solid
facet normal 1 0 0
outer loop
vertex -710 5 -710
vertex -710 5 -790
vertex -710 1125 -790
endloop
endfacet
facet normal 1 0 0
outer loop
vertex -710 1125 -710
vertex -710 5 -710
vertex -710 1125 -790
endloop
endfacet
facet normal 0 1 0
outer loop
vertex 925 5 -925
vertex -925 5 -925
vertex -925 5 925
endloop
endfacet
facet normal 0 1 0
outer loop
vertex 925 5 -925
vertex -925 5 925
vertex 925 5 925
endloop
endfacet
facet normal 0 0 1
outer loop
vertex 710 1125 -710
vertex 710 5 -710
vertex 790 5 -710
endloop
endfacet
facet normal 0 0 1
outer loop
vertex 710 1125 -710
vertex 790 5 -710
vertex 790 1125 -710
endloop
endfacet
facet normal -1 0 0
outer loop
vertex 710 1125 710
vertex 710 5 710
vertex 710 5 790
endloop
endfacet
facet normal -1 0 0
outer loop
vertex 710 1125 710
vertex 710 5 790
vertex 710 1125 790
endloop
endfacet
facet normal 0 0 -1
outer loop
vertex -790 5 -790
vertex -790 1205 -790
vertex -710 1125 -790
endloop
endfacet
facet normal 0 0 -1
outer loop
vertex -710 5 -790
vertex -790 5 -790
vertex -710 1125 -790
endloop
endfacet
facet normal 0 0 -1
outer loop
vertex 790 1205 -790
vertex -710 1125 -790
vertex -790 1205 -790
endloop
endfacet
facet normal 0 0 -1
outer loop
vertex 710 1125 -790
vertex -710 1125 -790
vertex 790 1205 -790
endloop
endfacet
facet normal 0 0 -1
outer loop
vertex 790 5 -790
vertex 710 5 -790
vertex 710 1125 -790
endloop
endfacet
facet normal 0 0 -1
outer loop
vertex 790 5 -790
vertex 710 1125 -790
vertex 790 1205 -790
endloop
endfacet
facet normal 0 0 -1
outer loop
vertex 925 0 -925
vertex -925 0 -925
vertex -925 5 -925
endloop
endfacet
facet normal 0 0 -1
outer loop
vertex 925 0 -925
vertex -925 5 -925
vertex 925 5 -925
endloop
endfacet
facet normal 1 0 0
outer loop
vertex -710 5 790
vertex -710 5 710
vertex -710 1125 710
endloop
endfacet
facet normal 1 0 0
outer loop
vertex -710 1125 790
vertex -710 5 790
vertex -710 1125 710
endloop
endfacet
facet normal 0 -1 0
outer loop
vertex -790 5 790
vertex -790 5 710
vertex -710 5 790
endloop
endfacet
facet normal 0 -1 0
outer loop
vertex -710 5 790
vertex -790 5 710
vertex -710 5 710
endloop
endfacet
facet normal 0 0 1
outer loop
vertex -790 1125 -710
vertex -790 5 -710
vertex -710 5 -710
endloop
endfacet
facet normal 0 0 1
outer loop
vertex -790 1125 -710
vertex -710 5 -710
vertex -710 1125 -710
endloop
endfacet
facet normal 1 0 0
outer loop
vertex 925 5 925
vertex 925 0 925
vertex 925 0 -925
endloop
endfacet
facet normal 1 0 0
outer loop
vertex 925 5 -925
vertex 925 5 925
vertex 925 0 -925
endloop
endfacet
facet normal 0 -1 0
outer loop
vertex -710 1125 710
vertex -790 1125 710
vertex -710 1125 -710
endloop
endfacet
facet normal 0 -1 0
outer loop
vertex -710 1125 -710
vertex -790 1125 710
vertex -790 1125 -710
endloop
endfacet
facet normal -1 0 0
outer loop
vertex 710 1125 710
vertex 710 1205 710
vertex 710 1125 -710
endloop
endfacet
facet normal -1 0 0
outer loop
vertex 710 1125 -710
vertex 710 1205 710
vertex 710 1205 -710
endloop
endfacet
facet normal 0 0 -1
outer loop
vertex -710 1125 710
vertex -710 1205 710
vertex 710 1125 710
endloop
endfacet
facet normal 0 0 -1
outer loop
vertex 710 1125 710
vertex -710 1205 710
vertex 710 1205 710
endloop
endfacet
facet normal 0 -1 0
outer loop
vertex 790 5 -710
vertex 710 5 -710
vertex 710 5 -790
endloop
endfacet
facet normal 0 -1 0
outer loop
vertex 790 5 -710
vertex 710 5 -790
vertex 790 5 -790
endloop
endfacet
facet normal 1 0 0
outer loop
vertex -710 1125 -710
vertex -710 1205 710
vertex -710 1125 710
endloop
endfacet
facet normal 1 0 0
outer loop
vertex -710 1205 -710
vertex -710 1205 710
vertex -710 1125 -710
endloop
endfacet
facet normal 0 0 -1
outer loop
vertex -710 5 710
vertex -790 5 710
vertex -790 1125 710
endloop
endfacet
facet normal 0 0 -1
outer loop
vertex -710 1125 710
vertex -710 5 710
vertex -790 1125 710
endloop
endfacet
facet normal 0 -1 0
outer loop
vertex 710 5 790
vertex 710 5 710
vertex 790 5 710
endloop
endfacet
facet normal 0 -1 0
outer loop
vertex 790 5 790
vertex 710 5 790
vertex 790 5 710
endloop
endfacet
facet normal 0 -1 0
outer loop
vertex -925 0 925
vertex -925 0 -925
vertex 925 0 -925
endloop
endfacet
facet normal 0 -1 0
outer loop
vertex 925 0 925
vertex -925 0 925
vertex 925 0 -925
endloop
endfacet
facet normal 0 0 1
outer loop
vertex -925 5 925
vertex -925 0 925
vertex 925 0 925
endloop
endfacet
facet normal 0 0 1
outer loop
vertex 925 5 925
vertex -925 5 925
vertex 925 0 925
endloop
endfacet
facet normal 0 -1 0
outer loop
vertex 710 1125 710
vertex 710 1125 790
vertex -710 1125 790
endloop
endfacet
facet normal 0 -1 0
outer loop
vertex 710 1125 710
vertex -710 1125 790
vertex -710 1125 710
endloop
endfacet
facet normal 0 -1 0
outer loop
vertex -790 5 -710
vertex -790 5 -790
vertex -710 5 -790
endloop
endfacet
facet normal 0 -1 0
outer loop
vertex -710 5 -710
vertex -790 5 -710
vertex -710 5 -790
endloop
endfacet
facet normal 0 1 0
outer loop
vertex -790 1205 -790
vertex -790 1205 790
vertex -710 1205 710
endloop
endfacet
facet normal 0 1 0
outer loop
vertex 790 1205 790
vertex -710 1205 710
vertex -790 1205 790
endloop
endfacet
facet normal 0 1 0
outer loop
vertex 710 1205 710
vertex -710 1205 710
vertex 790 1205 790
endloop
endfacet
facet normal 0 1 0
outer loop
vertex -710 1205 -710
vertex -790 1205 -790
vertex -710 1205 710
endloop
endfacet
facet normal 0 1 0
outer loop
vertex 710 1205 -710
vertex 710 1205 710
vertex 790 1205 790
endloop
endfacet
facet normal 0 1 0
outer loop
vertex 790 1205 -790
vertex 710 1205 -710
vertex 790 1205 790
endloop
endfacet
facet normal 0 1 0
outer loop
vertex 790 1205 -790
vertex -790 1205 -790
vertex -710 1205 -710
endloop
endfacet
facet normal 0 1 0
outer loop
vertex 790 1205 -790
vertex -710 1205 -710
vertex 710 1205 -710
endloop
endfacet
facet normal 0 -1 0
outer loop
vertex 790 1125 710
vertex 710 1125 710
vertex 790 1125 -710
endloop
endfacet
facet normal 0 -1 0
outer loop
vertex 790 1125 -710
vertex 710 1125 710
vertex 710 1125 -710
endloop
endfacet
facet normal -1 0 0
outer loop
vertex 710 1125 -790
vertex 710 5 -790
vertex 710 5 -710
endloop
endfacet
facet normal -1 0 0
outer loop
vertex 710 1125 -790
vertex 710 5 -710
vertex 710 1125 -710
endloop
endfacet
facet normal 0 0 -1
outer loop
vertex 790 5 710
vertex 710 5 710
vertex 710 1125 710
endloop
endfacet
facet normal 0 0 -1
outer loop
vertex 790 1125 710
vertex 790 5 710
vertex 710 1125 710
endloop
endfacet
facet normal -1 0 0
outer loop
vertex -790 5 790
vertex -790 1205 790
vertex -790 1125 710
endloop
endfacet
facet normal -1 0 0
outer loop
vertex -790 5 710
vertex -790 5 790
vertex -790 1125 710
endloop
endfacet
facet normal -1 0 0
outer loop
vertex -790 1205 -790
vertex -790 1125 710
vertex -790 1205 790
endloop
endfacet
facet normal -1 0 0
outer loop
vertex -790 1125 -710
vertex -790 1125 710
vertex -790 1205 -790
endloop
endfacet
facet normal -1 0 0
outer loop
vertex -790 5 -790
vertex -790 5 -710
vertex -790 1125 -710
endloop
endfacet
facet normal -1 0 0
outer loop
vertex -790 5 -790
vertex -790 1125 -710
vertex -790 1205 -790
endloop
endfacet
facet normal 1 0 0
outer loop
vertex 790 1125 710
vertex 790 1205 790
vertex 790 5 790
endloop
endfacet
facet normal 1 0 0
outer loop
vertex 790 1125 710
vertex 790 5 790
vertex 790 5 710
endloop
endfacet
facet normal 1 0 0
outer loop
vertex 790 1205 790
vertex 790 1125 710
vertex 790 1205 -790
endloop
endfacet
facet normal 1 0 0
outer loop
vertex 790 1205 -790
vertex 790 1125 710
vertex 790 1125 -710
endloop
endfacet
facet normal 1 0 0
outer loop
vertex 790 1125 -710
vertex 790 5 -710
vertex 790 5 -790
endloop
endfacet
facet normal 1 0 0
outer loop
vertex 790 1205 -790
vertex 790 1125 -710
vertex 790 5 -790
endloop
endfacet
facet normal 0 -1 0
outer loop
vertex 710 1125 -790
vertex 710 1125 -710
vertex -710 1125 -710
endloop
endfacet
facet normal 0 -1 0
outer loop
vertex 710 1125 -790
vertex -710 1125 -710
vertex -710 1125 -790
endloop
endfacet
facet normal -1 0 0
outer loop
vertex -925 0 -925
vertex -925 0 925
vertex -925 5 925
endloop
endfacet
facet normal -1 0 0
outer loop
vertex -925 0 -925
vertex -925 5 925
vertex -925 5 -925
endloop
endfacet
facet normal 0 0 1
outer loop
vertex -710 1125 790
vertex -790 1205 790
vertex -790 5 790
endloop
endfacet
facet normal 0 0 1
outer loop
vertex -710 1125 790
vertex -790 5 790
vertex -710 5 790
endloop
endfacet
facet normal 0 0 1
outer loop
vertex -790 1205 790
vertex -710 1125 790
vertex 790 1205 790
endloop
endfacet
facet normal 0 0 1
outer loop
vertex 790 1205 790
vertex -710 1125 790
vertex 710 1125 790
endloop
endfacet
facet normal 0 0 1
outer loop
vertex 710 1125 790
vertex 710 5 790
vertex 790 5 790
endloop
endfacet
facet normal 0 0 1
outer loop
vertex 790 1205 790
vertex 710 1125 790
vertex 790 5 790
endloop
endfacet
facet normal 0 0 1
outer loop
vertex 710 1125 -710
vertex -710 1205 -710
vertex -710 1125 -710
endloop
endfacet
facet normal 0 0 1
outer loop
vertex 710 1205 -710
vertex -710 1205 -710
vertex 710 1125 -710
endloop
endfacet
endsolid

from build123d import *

# Parameters (mm, degrees)
SKETCH1_W               = 1850
SKETCH1_H               = 1850
BOSS_EXTRUDE1_DEPTH     = 5
SKETCH2_W               = 1580
SKETCH2_H               = 1580
BOSS_EXTRUDE2_DEPTH     = 1200
CUT_EXTRUDE1_DEPTH      = 1779.559810633
CUT_EXTRUDE1_DEPTH_BACK = 1779.559810633
SKETCH3_W               = 1420
SKETCH3_H               = 1120
CUT_EXTRUDE2_DEPTH      = 1779.559810633
CUT_EXTRUDE2_DEPTH_BACK = 1779.559810633
SKETCH4_W               = 1420
SKETCH4_H               = 1120
SKETCH5_W               = 1420
SKETCH5_H               = 1420
CUT_EXTRUDE3_DEPTH      = 80


with BuildPart() as part:
    # Sketch1 → Boss-Extrude1 (new body)
    with BuildSketch(Plane(origin=(0, 0, 0), x_dir=(1, 0, 0), z_dir=(0, 1, 0))):
        Rectangle(SKETCH1_W, SKETCH1_H)
    extrude(amount=BOSS_EXTRUDE1_DEPTH)


with BuildPart() as body_2:
    # Sketch2 → Boss-Extrude2 (new body)
    with BuildSketch(Plane(origin=(0, 5, 0), x_dir=(1, 0, 0), z_dir=(0, 1, 0))):
        Rectangle(SKETCH2_W, SKETCH2_H)
    extrude(amount=BOSS_EXTRUDE2_DEPTH)

    # Sketch3 → Cut-Extrude1 (cut, two sides: drawn at the far end of the back side and taken through both)
    with BuildSketch(Plane.XY.offset(-CUT_EXTRUDE1_DEPTH_BACK)):
        with Locations((0, 565)):
            Rectangle(SKETCH3_W, SKETCH3_H)
    extrude(amount=CUT_EXTRUDE1_DEPTH + CUT_EXTRUDE1_DEPTH_BACK, mode=Mode.SUBTRACT)

    # Sketch4 → Cut-Extrude2 (cut, two sides: drawn at the far end of the back side and taken through both)
    with BuildSketch(Plane(origin=(0, 0, 0), x_dir=(0, 0, -1), z_dir=(1, 0, 0)).offset(-CUT_EXTRUDE2_DEPTH_BACK)):
        with Locations((0, 565)):
            Rectangle(SKETCH4_W, SKETCH4_H)
    extrude(amount=CUT_EXTRUDE2_DEPTH + CUT_EXTRUDE2_DEPTH_BACK, mode=Mode.SUBTRACT)

    # Sketch5 → Cut-Extrude3 (cut)
    with BuildSketch(Plane(origin=(0, 1205, 0), x_dir=(1, 0, 0), z_dir=(0, 1, 0))):
        Rectangle(SKETCH5_W, SKETCH5_H)
    extrude(amount=-CUT_EXTRUDE3_DEPTH, mode=Mode.SUBTRACT)


solid = Compound([part.part, body_2.part])
